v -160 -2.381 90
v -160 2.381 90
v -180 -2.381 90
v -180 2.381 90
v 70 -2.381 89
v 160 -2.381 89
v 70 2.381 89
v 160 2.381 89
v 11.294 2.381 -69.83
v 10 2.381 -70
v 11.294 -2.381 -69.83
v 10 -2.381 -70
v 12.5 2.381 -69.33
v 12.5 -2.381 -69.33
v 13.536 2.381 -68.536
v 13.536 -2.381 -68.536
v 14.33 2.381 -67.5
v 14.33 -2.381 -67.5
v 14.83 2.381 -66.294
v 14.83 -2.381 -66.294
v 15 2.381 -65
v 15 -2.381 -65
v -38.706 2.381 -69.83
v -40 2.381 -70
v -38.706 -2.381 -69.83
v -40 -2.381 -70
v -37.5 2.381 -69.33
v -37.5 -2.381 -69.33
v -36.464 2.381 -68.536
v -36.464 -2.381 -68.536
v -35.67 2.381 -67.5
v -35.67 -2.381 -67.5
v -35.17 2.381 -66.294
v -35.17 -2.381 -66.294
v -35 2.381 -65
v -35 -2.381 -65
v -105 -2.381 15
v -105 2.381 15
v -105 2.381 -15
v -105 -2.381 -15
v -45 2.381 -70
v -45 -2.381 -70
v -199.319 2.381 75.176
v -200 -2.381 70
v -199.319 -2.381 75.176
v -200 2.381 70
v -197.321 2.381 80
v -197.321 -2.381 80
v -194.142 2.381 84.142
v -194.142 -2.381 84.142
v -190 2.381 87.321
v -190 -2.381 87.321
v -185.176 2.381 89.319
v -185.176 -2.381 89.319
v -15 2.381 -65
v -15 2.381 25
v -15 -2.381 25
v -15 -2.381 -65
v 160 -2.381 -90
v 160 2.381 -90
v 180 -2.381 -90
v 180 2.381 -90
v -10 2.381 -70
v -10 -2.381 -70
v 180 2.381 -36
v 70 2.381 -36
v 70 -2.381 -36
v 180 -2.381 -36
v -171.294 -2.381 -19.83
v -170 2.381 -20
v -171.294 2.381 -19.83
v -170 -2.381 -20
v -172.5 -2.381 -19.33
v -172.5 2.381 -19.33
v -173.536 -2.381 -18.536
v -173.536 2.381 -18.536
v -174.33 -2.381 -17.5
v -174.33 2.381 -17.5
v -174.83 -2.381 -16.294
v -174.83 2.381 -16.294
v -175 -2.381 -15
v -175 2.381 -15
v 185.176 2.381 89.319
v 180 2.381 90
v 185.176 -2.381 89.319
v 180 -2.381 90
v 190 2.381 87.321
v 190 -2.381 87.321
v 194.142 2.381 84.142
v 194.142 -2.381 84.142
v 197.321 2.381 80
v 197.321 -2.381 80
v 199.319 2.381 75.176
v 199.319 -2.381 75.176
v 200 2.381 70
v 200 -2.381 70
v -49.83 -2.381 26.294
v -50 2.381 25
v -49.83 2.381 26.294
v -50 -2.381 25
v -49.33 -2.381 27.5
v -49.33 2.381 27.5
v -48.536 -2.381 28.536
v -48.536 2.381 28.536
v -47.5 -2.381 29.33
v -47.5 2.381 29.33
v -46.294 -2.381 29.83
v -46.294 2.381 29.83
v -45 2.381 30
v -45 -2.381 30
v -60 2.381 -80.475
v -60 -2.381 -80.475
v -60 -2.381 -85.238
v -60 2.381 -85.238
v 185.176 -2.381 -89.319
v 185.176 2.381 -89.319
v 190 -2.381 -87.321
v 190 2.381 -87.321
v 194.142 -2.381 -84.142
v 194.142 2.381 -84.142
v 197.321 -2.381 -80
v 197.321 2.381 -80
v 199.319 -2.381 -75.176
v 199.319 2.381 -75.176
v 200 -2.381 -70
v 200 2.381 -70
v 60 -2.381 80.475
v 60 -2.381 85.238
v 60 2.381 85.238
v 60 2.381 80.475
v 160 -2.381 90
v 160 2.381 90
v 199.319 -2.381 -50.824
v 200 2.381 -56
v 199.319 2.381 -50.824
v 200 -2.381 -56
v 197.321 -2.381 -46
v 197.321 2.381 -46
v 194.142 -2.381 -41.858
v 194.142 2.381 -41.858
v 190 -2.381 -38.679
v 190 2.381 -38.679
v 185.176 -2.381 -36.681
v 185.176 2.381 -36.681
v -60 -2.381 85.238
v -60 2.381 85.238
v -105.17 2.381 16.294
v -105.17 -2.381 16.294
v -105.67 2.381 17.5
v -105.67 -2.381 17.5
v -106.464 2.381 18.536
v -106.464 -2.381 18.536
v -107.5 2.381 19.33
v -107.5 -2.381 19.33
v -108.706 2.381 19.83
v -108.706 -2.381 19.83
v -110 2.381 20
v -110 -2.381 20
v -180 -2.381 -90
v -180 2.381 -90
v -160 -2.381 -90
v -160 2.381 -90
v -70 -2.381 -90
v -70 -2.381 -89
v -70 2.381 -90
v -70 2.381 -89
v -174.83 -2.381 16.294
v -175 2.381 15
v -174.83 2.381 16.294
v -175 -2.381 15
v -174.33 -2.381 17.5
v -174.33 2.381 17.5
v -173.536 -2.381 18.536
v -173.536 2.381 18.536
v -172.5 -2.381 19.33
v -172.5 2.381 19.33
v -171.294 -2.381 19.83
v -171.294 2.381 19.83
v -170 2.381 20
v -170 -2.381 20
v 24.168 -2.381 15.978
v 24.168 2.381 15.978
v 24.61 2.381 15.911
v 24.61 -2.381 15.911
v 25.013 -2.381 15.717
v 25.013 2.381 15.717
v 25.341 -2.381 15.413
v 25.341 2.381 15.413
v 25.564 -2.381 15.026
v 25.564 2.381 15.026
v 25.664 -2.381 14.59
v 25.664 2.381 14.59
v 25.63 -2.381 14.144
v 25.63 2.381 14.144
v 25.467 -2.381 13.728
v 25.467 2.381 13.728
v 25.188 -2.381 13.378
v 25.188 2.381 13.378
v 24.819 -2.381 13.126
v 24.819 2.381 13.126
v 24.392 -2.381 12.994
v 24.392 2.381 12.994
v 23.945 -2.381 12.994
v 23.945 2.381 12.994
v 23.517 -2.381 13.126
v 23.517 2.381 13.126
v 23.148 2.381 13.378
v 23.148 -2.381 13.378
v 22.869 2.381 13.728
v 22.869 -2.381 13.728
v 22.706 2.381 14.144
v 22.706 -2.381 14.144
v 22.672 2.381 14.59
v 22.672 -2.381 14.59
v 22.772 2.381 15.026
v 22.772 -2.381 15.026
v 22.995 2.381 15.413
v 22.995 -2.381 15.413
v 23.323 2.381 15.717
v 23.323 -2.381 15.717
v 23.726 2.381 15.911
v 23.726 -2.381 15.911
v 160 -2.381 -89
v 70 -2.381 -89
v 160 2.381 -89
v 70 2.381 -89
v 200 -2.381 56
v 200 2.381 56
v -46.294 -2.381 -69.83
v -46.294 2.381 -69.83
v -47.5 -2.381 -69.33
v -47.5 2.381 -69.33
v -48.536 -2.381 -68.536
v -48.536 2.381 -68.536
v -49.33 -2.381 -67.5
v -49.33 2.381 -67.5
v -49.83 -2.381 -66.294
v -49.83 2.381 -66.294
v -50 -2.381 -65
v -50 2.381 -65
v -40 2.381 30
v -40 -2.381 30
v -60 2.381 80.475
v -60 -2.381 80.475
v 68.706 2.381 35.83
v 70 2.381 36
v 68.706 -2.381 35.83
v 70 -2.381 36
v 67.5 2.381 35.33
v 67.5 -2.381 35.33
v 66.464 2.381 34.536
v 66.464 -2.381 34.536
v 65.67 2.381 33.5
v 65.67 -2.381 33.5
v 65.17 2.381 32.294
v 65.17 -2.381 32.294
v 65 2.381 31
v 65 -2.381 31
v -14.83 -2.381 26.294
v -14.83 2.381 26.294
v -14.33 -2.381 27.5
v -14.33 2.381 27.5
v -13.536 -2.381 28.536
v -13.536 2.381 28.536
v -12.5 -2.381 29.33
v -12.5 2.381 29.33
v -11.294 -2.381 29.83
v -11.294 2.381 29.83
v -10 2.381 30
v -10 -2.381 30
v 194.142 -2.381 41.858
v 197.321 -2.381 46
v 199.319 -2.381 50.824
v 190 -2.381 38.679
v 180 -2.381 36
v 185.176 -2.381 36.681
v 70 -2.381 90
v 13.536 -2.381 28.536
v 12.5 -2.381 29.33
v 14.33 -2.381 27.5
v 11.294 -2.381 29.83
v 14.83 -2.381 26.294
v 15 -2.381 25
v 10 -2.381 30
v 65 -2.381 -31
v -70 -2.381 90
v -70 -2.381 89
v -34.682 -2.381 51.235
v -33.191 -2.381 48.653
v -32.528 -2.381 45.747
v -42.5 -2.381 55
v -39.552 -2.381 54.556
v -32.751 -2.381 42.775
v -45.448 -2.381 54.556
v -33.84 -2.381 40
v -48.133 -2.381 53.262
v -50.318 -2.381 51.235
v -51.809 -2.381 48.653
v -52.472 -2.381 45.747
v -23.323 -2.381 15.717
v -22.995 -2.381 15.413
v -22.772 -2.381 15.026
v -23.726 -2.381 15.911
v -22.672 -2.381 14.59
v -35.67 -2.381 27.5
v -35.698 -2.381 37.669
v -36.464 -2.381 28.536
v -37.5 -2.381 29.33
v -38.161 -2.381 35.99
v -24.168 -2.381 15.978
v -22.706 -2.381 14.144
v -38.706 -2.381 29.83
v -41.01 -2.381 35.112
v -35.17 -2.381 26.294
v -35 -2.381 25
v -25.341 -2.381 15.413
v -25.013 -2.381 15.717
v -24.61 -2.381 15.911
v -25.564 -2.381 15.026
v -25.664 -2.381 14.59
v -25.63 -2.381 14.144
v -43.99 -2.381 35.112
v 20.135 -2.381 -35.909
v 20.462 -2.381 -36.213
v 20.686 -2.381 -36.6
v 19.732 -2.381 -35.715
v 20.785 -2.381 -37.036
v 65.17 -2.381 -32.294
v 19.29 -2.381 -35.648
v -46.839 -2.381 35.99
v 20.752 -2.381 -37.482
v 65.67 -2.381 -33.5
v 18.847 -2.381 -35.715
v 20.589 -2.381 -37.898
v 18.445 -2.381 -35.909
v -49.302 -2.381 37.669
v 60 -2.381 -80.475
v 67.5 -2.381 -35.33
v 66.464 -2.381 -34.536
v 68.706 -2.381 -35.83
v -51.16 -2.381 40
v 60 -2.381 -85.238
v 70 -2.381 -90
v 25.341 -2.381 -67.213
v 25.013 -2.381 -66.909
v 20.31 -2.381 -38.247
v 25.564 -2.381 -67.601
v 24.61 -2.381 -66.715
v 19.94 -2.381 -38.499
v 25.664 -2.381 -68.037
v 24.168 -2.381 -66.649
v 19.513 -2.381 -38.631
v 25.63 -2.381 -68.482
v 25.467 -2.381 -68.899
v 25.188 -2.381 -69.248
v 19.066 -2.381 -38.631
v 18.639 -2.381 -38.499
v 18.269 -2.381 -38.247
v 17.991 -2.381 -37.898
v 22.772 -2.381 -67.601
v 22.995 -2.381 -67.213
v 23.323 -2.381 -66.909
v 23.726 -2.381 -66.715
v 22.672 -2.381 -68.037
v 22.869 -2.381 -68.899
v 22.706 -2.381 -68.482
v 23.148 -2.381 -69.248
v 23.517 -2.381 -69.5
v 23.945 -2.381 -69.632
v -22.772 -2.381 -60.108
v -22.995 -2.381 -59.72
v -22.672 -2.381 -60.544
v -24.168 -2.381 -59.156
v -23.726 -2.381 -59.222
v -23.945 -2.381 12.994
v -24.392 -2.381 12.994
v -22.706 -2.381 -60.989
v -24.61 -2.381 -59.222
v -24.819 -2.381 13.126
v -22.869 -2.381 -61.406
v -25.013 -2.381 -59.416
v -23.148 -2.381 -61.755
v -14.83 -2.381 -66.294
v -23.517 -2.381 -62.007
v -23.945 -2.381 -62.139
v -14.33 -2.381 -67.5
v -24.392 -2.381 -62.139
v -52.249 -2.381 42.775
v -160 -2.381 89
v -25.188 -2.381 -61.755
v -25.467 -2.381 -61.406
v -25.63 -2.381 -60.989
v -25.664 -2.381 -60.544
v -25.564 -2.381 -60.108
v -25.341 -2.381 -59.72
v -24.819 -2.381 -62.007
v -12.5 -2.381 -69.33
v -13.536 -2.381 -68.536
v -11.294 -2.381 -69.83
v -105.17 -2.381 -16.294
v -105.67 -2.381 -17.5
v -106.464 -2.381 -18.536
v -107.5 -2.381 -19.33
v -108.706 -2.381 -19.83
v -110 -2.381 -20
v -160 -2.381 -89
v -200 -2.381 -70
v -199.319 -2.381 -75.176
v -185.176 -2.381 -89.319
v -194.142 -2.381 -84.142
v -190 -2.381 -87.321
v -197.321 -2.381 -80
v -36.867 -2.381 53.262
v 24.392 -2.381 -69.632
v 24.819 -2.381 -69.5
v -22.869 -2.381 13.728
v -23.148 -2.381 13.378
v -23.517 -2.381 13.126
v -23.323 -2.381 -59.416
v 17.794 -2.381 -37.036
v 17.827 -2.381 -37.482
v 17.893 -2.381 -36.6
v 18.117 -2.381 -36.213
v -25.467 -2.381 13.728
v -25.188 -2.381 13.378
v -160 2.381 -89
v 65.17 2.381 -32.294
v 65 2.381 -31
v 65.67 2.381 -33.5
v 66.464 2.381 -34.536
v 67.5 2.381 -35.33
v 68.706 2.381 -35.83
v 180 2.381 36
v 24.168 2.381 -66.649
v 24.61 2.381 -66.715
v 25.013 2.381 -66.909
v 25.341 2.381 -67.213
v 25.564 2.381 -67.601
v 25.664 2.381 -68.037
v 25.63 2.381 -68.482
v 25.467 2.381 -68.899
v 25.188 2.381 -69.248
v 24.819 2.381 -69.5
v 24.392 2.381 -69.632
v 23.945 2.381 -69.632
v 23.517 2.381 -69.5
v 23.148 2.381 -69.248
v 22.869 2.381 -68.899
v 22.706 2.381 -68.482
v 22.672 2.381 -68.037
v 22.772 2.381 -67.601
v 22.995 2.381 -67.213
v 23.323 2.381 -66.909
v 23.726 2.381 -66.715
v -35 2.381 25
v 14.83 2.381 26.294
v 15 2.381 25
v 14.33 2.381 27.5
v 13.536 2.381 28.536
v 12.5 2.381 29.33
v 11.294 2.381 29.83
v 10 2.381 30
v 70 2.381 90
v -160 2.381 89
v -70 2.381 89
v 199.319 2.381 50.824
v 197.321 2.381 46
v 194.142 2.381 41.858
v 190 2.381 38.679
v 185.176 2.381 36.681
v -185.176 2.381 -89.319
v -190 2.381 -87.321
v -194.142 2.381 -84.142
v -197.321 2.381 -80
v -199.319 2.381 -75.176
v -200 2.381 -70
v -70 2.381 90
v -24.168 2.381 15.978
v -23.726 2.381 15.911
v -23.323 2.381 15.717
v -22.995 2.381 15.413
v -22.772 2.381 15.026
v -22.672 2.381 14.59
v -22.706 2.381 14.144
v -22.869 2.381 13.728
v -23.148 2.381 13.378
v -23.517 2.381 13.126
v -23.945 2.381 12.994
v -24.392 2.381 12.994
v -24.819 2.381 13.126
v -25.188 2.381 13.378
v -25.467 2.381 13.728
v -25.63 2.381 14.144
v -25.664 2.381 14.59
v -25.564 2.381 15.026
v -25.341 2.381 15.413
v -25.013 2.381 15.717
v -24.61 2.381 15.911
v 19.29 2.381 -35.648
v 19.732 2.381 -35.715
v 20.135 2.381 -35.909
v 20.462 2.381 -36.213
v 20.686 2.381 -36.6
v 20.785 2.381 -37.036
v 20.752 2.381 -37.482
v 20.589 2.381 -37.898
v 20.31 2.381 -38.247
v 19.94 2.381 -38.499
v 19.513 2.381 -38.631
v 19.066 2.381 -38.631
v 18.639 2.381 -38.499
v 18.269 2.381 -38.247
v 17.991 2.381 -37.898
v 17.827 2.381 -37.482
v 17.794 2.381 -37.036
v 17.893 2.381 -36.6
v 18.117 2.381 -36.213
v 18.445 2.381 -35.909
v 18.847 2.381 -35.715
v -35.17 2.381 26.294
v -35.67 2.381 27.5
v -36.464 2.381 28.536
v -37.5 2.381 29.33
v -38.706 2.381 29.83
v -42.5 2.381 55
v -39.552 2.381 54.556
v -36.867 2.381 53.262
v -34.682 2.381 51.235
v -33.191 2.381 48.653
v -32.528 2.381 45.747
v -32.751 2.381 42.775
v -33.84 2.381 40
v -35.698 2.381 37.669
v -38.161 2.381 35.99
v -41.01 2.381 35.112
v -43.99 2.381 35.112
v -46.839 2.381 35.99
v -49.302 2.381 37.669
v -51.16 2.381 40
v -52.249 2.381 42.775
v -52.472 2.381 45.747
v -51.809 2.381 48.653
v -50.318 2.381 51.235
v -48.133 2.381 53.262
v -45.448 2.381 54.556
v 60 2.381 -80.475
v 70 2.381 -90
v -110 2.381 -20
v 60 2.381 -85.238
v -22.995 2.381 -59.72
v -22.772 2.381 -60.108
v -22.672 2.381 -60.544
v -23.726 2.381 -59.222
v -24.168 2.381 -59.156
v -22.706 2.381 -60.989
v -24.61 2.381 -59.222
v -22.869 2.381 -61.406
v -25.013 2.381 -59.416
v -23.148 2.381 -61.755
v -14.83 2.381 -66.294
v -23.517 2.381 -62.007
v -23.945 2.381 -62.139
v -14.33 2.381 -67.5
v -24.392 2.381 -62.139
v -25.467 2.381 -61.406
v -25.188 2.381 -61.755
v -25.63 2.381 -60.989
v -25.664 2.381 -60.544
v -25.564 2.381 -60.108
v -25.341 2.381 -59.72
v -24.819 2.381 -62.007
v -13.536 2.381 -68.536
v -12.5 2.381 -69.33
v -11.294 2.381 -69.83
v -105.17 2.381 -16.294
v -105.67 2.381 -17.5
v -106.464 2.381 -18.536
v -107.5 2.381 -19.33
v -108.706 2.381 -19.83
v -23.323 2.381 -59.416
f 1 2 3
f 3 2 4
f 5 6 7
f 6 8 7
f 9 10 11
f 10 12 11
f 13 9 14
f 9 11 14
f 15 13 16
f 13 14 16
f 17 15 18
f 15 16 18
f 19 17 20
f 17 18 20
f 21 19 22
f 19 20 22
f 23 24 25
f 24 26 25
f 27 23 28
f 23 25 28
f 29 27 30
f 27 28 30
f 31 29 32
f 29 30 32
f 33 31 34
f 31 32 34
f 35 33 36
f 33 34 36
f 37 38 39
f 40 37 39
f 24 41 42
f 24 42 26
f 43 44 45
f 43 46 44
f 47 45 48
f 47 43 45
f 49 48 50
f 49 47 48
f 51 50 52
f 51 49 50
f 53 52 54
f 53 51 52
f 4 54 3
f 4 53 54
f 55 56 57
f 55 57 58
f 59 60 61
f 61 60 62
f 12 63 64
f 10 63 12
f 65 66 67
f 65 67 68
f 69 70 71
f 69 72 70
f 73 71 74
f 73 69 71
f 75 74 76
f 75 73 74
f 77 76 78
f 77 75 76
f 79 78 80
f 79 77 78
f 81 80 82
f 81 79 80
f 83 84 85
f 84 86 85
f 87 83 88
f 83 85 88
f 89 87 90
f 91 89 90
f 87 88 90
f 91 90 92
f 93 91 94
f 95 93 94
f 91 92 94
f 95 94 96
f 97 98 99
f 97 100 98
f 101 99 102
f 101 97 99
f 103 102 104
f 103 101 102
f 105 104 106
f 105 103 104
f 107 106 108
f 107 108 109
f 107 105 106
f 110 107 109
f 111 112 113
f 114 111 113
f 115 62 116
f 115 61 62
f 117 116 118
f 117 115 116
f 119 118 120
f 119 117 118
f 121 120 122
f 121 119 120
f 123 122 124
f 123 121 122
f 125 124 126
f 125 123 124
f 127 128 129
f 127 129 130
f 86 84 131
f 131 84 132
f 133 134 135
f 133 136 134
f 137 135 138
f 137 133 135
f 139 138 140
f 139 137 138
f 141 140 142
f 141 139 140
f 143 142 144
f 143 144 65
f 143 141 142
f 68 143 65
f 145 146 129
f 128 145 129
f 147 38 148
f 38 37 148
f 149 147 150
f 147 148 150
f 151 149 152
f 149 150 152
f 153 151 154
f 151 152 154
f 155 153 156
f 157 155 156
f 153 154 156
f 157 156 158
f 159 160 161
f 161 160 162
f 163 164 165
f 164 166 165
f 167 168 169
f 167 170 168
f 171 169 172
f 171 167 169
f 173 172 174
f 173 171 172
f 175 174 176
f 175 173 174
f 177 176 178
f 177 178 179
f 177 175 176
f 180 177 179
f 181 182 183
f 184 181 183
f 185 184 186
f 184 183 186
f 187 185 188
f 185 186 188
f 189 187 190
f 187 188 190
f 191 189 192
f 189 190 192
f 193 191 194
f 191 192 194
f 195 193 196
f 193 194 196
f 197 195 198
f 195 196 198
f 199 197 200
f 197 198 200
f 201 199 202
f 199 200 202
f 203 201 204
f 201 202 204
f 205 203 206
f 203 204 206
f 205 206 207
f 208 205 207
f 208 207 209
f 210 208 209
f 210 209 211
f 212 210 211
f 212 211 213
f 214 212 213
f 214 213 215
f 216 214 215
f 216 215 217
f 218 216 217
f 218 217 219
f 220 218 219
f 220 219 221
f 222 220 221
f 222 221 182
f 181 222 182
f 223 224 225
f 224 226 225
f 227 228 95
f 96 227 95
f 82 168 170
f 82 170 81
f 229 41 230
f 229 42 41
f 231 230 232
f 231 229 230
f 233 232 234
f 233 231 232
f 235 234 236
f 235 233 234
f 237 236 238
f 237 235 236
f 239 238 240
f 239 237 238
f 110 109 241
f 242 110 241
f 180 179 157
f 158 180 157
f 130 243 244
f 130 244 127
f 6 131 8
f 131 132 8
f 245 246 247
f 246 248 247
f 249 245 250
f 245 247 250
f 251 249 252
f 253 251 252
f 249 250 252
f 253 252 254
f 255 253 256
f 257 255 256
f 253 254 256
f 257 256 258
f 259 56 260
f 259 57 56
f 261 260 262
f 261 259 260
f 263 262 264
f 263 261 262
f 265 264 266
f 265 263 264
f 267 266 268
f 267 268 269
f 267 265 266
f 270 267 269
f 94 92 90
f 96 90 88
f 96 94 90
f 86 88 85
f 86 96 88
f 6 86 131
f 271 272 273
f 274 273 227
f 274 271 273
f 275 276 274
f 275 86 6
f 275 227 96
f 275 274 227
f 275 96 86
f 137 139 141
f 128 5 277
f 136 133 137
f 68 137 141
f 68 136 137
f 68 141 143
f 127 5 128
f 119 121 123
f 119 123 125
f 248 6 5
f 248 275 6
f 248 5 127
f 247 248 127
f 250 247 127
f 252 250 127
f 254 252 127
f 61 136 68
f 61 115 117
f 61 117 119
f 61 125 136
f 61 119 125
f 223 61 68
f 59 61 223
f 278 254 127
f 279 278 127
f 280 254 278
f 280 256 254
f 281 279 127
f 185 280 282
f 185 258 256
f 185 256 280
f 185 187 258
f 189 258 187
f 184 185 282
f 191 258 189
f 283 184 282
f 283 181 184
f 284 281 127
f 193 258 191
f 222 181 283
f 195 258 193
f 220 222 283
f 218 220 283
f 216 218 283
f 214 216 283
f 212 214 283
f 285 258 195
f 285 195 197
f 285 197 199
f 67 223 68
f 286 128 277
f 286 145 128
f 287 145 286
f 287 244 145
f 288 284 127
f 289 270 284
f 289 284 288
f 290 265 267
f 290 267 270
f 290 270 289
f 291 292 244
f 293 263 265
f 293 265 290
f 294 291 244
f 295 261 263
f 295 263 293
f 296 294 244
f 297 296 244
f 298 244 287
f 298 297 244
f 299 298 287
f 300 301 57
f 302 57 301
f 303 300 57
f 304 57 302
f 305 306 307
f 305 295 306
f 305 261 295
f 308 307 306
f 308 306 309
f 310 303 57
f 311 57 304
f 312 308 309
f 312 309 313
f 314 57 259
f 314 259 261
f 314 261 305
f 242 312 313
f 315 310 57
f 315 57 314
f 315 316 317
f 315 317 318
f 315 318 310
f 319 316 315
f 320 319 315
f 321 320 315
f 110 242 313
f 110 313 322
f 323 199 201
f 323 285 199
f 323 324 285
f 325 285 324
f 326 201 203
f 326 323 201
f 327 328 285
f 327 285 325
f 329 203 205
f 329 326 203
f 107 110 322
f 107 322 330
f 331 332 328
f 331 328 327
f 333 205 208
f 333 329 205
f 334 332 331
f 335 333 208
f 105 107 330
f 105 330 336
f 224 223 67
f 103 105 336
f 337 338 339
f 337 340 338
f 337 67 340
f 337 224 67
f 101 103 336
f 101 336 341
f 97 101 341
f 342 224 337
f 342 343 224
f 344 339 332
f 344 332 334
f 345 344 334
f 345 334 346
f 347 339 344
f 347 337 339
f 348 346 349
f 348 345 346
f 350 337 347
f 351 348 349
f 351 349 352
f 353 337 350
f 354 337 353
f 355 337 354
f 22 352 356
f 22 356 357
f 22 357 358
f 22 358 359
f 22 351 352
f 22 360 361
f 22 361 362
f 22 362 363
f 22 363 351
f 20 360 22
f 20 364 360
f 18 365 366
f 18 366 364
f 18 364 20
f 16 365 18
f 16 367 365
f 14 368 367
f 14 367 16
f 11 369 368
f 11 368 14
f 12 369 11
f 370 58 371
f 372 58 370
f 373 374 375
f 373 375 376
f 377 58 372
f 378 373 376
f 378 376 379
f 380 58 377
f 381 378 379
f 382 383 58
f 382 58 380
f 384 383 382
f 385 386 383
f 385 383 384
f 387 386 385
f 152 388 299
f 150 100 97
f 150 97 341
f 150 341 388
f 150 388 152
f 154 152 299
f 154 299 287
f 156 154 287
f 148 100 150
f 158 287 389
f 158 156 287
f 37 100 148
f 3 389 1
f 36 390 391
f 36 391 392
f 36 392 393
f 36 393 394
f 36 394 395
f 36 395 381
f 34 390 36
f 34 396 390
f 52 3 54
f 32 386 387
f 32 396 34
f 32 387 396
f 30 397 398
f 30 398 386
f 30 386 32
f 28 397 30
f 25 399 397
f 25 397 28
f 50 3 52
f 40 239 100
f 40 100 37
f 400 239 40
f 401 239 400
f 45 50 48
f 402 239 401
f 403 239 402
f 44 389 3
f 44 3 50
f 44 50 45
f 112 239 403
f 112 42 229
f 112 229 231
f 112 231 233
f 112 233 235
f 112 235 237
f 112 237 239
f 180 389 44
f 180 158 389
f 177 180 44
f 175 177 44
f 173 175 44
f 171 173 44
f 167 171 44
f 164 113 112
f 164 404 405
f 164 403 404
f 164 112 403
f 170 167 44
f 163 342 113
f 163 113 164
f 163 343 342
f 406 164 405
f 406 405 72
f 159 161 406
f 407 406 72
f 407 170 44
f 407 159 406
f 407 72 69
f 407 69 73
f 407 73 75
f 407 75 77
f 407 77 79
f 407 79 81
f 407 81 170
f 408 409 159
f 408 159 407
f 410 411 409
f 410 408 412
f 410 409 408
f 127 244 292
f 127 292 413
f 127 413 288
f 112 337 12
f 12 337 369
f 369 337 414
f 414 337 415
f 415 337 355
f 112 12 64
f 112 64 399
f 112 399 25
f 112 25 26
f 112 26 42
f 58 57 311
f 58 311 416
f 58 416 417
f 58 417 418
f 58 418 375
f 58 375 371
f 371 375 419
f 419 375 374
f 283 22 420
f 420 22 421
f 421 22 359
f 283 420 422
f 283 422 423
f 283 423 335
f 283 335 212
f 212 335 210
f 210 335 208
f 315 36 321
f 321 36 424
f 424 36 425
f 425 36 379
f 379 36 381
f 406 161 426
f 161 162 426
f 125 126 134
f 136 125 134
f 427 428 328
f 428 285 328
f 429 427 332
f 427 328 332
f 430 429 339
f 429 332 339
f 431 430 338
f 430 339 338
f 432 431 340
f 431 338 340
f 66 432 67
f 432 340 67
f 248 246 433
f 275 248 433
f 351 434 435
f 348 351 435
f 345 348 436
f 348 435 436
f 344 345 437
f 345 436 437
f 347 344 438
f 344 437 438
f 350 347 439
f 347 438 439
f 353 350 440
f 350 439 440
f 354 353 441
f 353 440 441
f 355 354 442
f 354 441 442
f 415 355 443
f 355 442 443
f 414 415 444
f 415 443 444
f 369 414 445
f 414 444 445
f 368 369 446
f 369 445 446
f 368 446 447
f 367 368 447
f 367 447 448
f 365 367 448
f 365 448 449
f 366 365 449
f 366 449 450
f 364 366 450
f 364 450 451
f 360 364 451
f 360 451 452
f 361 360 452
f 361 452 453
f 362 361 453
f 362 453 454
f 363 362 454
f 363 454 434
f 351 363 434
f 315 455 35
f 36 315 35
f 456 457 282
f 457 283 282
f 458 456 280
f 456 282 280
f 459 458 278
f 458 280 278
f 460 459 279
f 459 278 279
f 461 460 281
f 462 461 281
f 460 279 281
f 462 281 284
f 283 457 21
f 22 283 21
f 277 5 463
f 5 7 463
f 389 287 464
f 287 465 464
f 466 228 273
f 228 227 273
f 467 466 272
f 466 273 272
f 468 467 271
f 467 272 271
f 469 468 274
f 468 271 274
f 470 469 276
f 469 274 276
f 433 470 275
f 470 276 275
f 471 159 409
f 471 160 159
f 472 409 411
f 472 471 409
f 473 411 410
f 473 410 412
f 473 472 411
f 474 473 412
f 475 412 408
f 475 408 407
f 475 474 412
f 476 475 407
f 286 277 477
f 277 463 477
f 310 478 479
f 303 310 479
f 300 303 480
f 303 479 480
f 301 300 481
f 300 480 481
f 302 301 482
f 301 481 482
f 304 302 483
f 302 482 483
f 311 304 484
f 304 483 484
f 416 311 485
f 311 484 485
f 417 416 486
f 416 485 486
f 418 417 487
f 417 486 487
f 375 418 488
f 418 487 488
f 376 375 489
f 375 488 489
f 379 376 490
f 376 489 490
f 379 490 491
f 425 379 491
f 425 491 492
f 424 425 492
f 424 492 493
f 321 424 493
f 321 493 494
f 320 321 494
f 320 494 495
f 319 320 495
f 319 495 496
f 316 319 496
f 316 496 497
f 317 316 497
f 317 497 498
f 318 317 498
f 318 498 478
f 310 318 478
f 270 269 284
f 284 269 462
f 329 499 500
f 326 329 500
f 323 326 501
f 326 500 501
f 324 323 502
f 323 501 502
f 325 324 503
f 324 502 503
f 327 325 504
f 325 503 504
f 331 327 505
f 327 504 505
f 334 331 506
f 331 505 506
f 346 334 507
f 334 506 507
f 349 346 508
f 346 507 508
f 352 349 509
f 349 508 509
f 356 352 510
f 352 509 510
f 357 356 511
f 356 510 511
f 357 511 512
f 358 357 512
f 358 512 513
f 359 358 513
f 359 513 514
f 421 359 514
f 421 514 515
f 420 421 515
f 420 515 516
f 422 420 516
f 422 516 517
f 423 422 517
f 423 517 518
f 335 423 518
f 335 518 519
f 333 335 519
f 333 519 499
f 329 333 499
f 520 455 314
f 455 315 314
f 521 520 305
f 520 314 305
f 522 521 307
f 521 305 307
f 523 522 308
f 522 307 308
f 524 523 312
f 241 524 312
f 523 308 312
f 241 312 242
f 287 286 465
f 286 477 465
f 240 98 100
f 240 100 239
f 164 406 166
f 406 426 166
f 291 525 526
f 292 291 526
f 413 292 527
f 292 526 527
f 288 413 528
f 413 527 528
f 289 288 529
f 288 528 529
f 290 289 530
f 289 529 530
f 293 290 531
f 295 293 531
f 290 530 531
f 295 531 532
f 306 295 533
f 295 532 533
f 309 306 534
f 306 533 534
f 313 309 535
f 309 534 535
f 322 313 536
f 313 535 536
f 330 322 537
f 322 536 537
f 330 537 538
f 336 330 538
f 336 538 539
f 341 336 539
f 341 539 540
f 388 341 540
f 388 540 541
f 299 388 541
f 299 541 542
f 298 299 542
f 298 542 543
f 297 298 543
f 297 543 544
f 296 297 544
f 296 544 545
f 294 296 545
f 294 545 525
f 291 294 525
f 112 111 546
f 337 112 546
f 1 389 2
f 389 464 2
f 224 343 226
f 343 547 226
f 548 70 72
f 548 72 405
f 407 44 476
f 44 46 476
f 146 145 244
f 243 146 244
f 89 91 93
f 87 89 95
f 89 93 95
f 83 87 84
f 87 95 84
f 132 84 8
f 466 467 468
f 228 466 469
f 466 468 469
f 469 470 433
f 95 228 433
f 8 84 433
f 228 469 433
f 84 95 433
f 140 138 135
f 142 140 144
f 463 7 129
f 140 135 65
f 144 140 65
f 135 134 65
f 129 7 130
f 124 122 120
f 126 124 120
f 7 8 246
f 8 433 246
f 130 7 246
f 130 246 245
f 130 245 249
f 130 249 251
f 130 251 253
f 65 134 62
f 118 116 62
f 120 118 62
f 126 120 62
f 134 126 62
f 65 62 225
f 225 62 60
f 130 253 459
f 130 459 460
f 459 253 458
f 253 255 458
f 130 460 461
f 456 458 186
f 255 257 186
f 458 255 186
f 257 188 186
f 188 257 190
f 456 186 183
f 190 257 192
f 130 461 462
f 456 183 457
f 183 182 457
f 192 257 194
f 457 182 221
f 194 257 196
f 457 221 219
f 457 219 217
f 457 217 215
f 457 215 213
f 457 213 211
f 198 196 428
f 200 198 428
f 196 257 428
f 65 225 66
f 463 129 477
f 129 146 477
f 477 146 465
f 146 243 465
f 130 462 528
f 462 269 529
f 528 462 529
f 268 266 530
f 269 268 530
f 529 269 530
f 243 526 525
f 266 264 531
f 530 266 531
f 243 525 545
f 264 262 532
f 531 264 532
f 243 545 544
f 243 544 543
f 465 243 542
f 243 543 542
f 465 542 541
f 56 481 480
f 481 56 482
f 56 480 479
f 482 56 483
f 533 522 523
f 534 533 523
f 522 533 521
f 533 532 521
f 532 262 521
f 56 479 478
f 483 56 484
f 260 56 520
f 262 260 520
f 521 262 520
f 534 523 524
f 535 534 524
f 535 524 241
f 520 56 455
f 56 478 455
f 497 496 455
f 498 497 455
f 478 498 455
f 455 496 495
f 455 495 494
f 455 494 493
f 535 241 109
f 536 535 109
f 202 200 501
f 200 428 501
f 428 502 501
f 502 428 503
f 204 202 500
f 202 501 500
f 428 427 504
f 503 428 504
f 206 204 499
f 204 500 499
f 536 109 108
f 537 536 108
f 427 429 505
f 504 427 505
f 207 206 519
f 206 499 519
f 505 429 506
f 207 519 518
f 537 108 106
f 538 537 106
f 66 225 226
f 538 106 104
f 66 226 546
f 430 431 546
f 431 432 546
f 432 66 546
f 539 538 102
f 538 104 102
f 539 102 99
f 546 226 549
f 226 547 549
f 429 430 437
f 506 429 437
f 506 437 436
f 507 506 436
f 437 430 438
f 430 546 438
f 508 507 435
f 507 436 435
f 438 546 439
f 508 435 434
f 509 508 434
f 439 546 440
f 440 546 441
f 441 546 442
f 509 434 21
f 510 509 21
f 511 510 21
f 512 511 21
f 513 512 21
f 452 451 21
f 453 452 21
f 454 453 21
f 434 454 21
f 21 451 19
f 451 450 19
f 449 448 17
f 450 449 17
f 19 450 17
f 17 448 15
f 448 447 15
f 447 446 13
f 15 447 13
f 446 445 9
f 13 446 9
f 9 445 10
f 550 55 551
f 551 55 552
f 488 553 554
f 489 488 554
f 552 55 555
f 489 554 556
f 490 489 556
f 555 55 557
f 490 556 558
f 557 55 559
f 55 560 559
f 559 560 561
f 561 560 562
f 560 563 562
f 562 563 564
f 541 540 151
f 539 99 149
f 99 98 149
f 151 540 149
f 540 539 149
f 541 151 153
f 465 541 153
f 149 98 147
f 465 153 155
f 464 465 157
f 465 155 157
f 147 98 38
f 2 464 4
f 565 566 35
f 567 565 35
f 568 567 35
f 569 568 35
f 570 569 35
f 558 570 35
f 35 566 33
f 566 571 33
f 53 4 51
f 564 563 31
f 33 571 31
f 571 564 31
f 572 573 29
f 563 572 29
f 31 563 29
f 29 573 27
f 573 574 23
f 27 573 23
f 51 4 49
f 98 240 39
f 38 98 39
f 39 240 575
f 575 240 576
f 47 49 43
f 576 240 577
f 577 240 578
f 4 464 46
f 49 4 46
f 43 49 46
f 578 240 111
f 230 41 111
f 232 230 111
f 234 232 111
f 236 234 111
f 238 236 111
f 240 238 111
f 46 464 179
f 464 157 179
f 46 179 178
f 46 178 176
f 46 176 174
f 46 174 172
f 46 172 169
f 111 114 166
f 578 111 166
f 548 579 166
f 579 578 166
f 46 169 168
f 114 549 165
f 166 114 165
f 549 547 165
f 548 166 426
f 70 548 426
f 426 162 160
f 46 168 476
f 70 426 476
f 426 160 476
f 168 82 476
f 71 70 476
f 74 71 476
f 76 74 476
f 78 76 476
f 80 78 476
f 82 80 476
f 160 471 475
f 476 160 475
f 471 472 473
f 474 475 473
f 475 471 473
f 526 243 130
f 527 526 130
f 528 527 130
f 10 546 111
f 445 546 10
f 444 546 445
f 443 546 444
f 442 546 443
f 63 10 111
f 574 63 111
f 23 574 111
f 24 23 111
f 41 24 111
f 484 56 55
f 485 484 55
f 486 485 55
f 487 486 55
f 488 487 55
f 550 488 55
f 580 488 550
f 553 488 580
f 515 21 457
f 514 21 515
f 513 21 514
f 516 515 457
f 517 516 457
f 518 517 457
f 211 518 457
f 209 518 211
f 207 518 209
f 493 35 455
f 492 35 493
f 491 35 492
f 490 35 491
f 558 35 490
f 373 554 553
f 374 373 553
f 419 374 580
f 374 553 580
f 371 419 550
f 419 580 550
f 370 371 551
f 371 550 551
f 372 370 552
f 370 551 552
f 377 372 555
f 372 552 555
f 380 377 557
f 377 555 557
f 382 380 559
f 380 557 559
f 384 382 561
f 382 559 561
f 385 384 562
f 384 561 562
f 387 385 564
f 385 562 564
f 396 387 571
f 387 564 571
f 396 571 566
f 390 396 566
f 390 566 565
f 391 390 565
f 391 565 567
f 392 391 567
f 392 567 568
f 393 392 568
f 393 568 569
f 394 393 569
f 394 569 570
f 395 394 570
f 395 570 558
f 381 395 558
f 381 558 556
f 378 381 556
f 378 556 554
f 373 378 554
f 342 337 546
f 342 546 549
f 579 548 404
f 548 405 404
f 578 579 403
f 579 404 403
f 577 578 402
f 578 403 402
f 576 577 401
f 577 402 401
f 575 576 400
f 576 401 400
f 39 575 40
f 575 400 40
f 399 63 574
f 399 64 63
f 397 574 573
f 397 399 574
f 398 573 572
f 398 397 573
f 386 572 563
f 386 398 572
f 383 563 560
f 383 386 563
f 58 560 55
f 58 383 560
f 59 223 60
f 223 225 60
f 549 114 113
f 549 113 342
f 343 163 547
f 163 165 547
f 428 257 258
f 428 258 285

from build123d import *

# Parameters (mm, degrees)
BOSS_EXTRUDE1_DEPTH = 2.38125
SKETCH2_W           = 135
SKETCH2_H           = 72
CUT_EXTRUDE1_DEPTH  = 10
SKETCH3_R           = 10
SKETCH3_W           = 15
SKETCH3_H           = 100
SKETCH3_W_2         = 70
SKETCH3_H_2         = 40
SKETCH3_W_3         = 30
CUT_EXTRUDE2_DEPTH  = 10
SKETCH4_R           = 1.5
CUT_EXTRUDE3_DEPTH  = 10
SKETCH5_W           = 120
SKETCH5_H           = 4.7625
CUT_EXTRUDE4_DEPTH  = 10
FILLET1_R           = 20
FILLET2_R           = 20
FILLET3_R           = 5


with BuildPart() as part:
    # Sketch1 → Boss-Extrude1 (new, symmetric)
    with BuildSketch(Plane(origin=(0, 0, 0), x_dir=(1, 0, 0), z_dir=(0, 1, 0))):
        Polygon((-200, 90), (-160, 90), (-160, 89), (-70, 89), (-70, 90), (70, 90), (70, 89), (160, 89), (160, 90), (200, 90), (200, -90), (160, -90), (160, -89), (70, -89), (70, -90), (-70, -90), (-70, -89), (-160, -89), (-160, -90), (-200, -90), align=None)
    extrude(amount=BOSS_EXTRUDE1_DEPTH, both=True)

    # Sketch2 → Cut-Extrude1 (cut)
    with BuildSketch(Plane(origin=(0, 2.38125, 0), x_dir=(1, 0, 0), z_dir=(0, 1, 0))):
        with Locations((132.5, 0)):
            Rectangle(SKETCH2_W, SKETCH2_H)
    extrude(amount=-CUT_EXTRUDE1_DEPTH, mode=Mode.SUBTRACT)

    # Sketch3 → Cut-Extrude2 (cut)
    with BuildSketch(Plane(origin=(0, 2.38125, 0), x_dir=(1, 0, 0), z_dir=(0, 1, 0))):
        with Locations(Location((-42.5, -45, 0), (0, 0, 270))):
            Circle(SKETCH3_R)
        with Locations((-42.5, 20)):
            Rectangle(SKETCH3_W, SKETCH3_H)
        with Locations((-140, 0)):
            Rectangle(SKETCH3_W_2, SKETCH3_H_2)
        with Locations((0, 20)):
            Rectangle(SKETCH3_W_3, SKETCH3_H)
    extrude(amount=-CUT_EXTRUDE2_DEPTH, mode=Mode.SUBTRACT)

    # Sketch4 → Cut-Extrude3 (cut)
    with BuildSketch(Plane(origin=(0, 2.38125, 0), x_dir=(1, 0, 0), z_dir=(0, 1, 0))):
        with Locations(Location((24.1681, -14.4776, 0), (0, 0, 270))):
            Circle(SKETCH4_R)
        with Locations(Location((-24.1681, -14.4776, 0), (0, 0, 270))):
            Circle(SKETCH4_R)
        with Locations(Location((-24.1681, 60.6556, 0), (0, 0, 270))):
            Circle(SKETCH4_R)
        with Locations(Location((24.1681, 68.1486, 0), (0, 0, 270))):
            Circle(SKETCH4_R)
        with Locations(Location((19.289607234, 37.1479, 0), (0, 0, 270))):
            Circle(SKETCH4_R)
    extrude(amount=-CUT_EXTRUDE3_DEPTH, mode=Mode.SUBTRACT)

    # Sketch5 → Cut-Extrude4 (cut)
    with BuildSketch(Plane(origin=(0, 2.38125, 0), x_dir=(1, 0, 0), z_dir=(0, 1, 0))):
        with Locations((0, 82.85625)):
            Rectangle(SKETCH5_W, SKETCH5_H)
        with Locations((0, -82.85625)):
            Rectangle(SKETCH5_W, SKETCH5_H)
    extrude(amount=-CUT_EXTRUDE4_DEPTH, mode=Mode.SUBTRACT)

    # Fillet1
    fillet1_edges = [part.edges().sort_by_distance(p)[0] for p in [
        (-200, 0, -90),
        (200, 0, -90),
        (200, 0, 90),
        (-200, 0, 90),
    ]]
    fillet(fillet1_edges, radius=FILLET1_R)

    # Fillet2
    fillet2_edges = [part.edges().sort_by_distance(p)[0] for p in [
        (200, 0, -36),
        (200, 0, 36),
    ]]
    fillet(fillet2_edges, radius=FILLET2_R)

    # Fillet3
    fillet3_edges = [part.edges().sort_by_distance(p)[0] for p in [
        (-175, 0, 20),
        (-175, 0, -20),
        (-105, 0, -20),
        (-105, 0, 20),
        (-35, 0, -70),
        (-35, 0, 30),
        (-50, 0, 30),
        (-50, 0, -70),
        (65, 0, 36),
        (65, 0, -36),
        (-15, 0, 30),
        (-15, 0, -70),
        (15, 0, -70),
        (15, 0, 30),
    ]]
    fillet(fillet3_edges, radius=FILLET3_R)


solid = part.part
